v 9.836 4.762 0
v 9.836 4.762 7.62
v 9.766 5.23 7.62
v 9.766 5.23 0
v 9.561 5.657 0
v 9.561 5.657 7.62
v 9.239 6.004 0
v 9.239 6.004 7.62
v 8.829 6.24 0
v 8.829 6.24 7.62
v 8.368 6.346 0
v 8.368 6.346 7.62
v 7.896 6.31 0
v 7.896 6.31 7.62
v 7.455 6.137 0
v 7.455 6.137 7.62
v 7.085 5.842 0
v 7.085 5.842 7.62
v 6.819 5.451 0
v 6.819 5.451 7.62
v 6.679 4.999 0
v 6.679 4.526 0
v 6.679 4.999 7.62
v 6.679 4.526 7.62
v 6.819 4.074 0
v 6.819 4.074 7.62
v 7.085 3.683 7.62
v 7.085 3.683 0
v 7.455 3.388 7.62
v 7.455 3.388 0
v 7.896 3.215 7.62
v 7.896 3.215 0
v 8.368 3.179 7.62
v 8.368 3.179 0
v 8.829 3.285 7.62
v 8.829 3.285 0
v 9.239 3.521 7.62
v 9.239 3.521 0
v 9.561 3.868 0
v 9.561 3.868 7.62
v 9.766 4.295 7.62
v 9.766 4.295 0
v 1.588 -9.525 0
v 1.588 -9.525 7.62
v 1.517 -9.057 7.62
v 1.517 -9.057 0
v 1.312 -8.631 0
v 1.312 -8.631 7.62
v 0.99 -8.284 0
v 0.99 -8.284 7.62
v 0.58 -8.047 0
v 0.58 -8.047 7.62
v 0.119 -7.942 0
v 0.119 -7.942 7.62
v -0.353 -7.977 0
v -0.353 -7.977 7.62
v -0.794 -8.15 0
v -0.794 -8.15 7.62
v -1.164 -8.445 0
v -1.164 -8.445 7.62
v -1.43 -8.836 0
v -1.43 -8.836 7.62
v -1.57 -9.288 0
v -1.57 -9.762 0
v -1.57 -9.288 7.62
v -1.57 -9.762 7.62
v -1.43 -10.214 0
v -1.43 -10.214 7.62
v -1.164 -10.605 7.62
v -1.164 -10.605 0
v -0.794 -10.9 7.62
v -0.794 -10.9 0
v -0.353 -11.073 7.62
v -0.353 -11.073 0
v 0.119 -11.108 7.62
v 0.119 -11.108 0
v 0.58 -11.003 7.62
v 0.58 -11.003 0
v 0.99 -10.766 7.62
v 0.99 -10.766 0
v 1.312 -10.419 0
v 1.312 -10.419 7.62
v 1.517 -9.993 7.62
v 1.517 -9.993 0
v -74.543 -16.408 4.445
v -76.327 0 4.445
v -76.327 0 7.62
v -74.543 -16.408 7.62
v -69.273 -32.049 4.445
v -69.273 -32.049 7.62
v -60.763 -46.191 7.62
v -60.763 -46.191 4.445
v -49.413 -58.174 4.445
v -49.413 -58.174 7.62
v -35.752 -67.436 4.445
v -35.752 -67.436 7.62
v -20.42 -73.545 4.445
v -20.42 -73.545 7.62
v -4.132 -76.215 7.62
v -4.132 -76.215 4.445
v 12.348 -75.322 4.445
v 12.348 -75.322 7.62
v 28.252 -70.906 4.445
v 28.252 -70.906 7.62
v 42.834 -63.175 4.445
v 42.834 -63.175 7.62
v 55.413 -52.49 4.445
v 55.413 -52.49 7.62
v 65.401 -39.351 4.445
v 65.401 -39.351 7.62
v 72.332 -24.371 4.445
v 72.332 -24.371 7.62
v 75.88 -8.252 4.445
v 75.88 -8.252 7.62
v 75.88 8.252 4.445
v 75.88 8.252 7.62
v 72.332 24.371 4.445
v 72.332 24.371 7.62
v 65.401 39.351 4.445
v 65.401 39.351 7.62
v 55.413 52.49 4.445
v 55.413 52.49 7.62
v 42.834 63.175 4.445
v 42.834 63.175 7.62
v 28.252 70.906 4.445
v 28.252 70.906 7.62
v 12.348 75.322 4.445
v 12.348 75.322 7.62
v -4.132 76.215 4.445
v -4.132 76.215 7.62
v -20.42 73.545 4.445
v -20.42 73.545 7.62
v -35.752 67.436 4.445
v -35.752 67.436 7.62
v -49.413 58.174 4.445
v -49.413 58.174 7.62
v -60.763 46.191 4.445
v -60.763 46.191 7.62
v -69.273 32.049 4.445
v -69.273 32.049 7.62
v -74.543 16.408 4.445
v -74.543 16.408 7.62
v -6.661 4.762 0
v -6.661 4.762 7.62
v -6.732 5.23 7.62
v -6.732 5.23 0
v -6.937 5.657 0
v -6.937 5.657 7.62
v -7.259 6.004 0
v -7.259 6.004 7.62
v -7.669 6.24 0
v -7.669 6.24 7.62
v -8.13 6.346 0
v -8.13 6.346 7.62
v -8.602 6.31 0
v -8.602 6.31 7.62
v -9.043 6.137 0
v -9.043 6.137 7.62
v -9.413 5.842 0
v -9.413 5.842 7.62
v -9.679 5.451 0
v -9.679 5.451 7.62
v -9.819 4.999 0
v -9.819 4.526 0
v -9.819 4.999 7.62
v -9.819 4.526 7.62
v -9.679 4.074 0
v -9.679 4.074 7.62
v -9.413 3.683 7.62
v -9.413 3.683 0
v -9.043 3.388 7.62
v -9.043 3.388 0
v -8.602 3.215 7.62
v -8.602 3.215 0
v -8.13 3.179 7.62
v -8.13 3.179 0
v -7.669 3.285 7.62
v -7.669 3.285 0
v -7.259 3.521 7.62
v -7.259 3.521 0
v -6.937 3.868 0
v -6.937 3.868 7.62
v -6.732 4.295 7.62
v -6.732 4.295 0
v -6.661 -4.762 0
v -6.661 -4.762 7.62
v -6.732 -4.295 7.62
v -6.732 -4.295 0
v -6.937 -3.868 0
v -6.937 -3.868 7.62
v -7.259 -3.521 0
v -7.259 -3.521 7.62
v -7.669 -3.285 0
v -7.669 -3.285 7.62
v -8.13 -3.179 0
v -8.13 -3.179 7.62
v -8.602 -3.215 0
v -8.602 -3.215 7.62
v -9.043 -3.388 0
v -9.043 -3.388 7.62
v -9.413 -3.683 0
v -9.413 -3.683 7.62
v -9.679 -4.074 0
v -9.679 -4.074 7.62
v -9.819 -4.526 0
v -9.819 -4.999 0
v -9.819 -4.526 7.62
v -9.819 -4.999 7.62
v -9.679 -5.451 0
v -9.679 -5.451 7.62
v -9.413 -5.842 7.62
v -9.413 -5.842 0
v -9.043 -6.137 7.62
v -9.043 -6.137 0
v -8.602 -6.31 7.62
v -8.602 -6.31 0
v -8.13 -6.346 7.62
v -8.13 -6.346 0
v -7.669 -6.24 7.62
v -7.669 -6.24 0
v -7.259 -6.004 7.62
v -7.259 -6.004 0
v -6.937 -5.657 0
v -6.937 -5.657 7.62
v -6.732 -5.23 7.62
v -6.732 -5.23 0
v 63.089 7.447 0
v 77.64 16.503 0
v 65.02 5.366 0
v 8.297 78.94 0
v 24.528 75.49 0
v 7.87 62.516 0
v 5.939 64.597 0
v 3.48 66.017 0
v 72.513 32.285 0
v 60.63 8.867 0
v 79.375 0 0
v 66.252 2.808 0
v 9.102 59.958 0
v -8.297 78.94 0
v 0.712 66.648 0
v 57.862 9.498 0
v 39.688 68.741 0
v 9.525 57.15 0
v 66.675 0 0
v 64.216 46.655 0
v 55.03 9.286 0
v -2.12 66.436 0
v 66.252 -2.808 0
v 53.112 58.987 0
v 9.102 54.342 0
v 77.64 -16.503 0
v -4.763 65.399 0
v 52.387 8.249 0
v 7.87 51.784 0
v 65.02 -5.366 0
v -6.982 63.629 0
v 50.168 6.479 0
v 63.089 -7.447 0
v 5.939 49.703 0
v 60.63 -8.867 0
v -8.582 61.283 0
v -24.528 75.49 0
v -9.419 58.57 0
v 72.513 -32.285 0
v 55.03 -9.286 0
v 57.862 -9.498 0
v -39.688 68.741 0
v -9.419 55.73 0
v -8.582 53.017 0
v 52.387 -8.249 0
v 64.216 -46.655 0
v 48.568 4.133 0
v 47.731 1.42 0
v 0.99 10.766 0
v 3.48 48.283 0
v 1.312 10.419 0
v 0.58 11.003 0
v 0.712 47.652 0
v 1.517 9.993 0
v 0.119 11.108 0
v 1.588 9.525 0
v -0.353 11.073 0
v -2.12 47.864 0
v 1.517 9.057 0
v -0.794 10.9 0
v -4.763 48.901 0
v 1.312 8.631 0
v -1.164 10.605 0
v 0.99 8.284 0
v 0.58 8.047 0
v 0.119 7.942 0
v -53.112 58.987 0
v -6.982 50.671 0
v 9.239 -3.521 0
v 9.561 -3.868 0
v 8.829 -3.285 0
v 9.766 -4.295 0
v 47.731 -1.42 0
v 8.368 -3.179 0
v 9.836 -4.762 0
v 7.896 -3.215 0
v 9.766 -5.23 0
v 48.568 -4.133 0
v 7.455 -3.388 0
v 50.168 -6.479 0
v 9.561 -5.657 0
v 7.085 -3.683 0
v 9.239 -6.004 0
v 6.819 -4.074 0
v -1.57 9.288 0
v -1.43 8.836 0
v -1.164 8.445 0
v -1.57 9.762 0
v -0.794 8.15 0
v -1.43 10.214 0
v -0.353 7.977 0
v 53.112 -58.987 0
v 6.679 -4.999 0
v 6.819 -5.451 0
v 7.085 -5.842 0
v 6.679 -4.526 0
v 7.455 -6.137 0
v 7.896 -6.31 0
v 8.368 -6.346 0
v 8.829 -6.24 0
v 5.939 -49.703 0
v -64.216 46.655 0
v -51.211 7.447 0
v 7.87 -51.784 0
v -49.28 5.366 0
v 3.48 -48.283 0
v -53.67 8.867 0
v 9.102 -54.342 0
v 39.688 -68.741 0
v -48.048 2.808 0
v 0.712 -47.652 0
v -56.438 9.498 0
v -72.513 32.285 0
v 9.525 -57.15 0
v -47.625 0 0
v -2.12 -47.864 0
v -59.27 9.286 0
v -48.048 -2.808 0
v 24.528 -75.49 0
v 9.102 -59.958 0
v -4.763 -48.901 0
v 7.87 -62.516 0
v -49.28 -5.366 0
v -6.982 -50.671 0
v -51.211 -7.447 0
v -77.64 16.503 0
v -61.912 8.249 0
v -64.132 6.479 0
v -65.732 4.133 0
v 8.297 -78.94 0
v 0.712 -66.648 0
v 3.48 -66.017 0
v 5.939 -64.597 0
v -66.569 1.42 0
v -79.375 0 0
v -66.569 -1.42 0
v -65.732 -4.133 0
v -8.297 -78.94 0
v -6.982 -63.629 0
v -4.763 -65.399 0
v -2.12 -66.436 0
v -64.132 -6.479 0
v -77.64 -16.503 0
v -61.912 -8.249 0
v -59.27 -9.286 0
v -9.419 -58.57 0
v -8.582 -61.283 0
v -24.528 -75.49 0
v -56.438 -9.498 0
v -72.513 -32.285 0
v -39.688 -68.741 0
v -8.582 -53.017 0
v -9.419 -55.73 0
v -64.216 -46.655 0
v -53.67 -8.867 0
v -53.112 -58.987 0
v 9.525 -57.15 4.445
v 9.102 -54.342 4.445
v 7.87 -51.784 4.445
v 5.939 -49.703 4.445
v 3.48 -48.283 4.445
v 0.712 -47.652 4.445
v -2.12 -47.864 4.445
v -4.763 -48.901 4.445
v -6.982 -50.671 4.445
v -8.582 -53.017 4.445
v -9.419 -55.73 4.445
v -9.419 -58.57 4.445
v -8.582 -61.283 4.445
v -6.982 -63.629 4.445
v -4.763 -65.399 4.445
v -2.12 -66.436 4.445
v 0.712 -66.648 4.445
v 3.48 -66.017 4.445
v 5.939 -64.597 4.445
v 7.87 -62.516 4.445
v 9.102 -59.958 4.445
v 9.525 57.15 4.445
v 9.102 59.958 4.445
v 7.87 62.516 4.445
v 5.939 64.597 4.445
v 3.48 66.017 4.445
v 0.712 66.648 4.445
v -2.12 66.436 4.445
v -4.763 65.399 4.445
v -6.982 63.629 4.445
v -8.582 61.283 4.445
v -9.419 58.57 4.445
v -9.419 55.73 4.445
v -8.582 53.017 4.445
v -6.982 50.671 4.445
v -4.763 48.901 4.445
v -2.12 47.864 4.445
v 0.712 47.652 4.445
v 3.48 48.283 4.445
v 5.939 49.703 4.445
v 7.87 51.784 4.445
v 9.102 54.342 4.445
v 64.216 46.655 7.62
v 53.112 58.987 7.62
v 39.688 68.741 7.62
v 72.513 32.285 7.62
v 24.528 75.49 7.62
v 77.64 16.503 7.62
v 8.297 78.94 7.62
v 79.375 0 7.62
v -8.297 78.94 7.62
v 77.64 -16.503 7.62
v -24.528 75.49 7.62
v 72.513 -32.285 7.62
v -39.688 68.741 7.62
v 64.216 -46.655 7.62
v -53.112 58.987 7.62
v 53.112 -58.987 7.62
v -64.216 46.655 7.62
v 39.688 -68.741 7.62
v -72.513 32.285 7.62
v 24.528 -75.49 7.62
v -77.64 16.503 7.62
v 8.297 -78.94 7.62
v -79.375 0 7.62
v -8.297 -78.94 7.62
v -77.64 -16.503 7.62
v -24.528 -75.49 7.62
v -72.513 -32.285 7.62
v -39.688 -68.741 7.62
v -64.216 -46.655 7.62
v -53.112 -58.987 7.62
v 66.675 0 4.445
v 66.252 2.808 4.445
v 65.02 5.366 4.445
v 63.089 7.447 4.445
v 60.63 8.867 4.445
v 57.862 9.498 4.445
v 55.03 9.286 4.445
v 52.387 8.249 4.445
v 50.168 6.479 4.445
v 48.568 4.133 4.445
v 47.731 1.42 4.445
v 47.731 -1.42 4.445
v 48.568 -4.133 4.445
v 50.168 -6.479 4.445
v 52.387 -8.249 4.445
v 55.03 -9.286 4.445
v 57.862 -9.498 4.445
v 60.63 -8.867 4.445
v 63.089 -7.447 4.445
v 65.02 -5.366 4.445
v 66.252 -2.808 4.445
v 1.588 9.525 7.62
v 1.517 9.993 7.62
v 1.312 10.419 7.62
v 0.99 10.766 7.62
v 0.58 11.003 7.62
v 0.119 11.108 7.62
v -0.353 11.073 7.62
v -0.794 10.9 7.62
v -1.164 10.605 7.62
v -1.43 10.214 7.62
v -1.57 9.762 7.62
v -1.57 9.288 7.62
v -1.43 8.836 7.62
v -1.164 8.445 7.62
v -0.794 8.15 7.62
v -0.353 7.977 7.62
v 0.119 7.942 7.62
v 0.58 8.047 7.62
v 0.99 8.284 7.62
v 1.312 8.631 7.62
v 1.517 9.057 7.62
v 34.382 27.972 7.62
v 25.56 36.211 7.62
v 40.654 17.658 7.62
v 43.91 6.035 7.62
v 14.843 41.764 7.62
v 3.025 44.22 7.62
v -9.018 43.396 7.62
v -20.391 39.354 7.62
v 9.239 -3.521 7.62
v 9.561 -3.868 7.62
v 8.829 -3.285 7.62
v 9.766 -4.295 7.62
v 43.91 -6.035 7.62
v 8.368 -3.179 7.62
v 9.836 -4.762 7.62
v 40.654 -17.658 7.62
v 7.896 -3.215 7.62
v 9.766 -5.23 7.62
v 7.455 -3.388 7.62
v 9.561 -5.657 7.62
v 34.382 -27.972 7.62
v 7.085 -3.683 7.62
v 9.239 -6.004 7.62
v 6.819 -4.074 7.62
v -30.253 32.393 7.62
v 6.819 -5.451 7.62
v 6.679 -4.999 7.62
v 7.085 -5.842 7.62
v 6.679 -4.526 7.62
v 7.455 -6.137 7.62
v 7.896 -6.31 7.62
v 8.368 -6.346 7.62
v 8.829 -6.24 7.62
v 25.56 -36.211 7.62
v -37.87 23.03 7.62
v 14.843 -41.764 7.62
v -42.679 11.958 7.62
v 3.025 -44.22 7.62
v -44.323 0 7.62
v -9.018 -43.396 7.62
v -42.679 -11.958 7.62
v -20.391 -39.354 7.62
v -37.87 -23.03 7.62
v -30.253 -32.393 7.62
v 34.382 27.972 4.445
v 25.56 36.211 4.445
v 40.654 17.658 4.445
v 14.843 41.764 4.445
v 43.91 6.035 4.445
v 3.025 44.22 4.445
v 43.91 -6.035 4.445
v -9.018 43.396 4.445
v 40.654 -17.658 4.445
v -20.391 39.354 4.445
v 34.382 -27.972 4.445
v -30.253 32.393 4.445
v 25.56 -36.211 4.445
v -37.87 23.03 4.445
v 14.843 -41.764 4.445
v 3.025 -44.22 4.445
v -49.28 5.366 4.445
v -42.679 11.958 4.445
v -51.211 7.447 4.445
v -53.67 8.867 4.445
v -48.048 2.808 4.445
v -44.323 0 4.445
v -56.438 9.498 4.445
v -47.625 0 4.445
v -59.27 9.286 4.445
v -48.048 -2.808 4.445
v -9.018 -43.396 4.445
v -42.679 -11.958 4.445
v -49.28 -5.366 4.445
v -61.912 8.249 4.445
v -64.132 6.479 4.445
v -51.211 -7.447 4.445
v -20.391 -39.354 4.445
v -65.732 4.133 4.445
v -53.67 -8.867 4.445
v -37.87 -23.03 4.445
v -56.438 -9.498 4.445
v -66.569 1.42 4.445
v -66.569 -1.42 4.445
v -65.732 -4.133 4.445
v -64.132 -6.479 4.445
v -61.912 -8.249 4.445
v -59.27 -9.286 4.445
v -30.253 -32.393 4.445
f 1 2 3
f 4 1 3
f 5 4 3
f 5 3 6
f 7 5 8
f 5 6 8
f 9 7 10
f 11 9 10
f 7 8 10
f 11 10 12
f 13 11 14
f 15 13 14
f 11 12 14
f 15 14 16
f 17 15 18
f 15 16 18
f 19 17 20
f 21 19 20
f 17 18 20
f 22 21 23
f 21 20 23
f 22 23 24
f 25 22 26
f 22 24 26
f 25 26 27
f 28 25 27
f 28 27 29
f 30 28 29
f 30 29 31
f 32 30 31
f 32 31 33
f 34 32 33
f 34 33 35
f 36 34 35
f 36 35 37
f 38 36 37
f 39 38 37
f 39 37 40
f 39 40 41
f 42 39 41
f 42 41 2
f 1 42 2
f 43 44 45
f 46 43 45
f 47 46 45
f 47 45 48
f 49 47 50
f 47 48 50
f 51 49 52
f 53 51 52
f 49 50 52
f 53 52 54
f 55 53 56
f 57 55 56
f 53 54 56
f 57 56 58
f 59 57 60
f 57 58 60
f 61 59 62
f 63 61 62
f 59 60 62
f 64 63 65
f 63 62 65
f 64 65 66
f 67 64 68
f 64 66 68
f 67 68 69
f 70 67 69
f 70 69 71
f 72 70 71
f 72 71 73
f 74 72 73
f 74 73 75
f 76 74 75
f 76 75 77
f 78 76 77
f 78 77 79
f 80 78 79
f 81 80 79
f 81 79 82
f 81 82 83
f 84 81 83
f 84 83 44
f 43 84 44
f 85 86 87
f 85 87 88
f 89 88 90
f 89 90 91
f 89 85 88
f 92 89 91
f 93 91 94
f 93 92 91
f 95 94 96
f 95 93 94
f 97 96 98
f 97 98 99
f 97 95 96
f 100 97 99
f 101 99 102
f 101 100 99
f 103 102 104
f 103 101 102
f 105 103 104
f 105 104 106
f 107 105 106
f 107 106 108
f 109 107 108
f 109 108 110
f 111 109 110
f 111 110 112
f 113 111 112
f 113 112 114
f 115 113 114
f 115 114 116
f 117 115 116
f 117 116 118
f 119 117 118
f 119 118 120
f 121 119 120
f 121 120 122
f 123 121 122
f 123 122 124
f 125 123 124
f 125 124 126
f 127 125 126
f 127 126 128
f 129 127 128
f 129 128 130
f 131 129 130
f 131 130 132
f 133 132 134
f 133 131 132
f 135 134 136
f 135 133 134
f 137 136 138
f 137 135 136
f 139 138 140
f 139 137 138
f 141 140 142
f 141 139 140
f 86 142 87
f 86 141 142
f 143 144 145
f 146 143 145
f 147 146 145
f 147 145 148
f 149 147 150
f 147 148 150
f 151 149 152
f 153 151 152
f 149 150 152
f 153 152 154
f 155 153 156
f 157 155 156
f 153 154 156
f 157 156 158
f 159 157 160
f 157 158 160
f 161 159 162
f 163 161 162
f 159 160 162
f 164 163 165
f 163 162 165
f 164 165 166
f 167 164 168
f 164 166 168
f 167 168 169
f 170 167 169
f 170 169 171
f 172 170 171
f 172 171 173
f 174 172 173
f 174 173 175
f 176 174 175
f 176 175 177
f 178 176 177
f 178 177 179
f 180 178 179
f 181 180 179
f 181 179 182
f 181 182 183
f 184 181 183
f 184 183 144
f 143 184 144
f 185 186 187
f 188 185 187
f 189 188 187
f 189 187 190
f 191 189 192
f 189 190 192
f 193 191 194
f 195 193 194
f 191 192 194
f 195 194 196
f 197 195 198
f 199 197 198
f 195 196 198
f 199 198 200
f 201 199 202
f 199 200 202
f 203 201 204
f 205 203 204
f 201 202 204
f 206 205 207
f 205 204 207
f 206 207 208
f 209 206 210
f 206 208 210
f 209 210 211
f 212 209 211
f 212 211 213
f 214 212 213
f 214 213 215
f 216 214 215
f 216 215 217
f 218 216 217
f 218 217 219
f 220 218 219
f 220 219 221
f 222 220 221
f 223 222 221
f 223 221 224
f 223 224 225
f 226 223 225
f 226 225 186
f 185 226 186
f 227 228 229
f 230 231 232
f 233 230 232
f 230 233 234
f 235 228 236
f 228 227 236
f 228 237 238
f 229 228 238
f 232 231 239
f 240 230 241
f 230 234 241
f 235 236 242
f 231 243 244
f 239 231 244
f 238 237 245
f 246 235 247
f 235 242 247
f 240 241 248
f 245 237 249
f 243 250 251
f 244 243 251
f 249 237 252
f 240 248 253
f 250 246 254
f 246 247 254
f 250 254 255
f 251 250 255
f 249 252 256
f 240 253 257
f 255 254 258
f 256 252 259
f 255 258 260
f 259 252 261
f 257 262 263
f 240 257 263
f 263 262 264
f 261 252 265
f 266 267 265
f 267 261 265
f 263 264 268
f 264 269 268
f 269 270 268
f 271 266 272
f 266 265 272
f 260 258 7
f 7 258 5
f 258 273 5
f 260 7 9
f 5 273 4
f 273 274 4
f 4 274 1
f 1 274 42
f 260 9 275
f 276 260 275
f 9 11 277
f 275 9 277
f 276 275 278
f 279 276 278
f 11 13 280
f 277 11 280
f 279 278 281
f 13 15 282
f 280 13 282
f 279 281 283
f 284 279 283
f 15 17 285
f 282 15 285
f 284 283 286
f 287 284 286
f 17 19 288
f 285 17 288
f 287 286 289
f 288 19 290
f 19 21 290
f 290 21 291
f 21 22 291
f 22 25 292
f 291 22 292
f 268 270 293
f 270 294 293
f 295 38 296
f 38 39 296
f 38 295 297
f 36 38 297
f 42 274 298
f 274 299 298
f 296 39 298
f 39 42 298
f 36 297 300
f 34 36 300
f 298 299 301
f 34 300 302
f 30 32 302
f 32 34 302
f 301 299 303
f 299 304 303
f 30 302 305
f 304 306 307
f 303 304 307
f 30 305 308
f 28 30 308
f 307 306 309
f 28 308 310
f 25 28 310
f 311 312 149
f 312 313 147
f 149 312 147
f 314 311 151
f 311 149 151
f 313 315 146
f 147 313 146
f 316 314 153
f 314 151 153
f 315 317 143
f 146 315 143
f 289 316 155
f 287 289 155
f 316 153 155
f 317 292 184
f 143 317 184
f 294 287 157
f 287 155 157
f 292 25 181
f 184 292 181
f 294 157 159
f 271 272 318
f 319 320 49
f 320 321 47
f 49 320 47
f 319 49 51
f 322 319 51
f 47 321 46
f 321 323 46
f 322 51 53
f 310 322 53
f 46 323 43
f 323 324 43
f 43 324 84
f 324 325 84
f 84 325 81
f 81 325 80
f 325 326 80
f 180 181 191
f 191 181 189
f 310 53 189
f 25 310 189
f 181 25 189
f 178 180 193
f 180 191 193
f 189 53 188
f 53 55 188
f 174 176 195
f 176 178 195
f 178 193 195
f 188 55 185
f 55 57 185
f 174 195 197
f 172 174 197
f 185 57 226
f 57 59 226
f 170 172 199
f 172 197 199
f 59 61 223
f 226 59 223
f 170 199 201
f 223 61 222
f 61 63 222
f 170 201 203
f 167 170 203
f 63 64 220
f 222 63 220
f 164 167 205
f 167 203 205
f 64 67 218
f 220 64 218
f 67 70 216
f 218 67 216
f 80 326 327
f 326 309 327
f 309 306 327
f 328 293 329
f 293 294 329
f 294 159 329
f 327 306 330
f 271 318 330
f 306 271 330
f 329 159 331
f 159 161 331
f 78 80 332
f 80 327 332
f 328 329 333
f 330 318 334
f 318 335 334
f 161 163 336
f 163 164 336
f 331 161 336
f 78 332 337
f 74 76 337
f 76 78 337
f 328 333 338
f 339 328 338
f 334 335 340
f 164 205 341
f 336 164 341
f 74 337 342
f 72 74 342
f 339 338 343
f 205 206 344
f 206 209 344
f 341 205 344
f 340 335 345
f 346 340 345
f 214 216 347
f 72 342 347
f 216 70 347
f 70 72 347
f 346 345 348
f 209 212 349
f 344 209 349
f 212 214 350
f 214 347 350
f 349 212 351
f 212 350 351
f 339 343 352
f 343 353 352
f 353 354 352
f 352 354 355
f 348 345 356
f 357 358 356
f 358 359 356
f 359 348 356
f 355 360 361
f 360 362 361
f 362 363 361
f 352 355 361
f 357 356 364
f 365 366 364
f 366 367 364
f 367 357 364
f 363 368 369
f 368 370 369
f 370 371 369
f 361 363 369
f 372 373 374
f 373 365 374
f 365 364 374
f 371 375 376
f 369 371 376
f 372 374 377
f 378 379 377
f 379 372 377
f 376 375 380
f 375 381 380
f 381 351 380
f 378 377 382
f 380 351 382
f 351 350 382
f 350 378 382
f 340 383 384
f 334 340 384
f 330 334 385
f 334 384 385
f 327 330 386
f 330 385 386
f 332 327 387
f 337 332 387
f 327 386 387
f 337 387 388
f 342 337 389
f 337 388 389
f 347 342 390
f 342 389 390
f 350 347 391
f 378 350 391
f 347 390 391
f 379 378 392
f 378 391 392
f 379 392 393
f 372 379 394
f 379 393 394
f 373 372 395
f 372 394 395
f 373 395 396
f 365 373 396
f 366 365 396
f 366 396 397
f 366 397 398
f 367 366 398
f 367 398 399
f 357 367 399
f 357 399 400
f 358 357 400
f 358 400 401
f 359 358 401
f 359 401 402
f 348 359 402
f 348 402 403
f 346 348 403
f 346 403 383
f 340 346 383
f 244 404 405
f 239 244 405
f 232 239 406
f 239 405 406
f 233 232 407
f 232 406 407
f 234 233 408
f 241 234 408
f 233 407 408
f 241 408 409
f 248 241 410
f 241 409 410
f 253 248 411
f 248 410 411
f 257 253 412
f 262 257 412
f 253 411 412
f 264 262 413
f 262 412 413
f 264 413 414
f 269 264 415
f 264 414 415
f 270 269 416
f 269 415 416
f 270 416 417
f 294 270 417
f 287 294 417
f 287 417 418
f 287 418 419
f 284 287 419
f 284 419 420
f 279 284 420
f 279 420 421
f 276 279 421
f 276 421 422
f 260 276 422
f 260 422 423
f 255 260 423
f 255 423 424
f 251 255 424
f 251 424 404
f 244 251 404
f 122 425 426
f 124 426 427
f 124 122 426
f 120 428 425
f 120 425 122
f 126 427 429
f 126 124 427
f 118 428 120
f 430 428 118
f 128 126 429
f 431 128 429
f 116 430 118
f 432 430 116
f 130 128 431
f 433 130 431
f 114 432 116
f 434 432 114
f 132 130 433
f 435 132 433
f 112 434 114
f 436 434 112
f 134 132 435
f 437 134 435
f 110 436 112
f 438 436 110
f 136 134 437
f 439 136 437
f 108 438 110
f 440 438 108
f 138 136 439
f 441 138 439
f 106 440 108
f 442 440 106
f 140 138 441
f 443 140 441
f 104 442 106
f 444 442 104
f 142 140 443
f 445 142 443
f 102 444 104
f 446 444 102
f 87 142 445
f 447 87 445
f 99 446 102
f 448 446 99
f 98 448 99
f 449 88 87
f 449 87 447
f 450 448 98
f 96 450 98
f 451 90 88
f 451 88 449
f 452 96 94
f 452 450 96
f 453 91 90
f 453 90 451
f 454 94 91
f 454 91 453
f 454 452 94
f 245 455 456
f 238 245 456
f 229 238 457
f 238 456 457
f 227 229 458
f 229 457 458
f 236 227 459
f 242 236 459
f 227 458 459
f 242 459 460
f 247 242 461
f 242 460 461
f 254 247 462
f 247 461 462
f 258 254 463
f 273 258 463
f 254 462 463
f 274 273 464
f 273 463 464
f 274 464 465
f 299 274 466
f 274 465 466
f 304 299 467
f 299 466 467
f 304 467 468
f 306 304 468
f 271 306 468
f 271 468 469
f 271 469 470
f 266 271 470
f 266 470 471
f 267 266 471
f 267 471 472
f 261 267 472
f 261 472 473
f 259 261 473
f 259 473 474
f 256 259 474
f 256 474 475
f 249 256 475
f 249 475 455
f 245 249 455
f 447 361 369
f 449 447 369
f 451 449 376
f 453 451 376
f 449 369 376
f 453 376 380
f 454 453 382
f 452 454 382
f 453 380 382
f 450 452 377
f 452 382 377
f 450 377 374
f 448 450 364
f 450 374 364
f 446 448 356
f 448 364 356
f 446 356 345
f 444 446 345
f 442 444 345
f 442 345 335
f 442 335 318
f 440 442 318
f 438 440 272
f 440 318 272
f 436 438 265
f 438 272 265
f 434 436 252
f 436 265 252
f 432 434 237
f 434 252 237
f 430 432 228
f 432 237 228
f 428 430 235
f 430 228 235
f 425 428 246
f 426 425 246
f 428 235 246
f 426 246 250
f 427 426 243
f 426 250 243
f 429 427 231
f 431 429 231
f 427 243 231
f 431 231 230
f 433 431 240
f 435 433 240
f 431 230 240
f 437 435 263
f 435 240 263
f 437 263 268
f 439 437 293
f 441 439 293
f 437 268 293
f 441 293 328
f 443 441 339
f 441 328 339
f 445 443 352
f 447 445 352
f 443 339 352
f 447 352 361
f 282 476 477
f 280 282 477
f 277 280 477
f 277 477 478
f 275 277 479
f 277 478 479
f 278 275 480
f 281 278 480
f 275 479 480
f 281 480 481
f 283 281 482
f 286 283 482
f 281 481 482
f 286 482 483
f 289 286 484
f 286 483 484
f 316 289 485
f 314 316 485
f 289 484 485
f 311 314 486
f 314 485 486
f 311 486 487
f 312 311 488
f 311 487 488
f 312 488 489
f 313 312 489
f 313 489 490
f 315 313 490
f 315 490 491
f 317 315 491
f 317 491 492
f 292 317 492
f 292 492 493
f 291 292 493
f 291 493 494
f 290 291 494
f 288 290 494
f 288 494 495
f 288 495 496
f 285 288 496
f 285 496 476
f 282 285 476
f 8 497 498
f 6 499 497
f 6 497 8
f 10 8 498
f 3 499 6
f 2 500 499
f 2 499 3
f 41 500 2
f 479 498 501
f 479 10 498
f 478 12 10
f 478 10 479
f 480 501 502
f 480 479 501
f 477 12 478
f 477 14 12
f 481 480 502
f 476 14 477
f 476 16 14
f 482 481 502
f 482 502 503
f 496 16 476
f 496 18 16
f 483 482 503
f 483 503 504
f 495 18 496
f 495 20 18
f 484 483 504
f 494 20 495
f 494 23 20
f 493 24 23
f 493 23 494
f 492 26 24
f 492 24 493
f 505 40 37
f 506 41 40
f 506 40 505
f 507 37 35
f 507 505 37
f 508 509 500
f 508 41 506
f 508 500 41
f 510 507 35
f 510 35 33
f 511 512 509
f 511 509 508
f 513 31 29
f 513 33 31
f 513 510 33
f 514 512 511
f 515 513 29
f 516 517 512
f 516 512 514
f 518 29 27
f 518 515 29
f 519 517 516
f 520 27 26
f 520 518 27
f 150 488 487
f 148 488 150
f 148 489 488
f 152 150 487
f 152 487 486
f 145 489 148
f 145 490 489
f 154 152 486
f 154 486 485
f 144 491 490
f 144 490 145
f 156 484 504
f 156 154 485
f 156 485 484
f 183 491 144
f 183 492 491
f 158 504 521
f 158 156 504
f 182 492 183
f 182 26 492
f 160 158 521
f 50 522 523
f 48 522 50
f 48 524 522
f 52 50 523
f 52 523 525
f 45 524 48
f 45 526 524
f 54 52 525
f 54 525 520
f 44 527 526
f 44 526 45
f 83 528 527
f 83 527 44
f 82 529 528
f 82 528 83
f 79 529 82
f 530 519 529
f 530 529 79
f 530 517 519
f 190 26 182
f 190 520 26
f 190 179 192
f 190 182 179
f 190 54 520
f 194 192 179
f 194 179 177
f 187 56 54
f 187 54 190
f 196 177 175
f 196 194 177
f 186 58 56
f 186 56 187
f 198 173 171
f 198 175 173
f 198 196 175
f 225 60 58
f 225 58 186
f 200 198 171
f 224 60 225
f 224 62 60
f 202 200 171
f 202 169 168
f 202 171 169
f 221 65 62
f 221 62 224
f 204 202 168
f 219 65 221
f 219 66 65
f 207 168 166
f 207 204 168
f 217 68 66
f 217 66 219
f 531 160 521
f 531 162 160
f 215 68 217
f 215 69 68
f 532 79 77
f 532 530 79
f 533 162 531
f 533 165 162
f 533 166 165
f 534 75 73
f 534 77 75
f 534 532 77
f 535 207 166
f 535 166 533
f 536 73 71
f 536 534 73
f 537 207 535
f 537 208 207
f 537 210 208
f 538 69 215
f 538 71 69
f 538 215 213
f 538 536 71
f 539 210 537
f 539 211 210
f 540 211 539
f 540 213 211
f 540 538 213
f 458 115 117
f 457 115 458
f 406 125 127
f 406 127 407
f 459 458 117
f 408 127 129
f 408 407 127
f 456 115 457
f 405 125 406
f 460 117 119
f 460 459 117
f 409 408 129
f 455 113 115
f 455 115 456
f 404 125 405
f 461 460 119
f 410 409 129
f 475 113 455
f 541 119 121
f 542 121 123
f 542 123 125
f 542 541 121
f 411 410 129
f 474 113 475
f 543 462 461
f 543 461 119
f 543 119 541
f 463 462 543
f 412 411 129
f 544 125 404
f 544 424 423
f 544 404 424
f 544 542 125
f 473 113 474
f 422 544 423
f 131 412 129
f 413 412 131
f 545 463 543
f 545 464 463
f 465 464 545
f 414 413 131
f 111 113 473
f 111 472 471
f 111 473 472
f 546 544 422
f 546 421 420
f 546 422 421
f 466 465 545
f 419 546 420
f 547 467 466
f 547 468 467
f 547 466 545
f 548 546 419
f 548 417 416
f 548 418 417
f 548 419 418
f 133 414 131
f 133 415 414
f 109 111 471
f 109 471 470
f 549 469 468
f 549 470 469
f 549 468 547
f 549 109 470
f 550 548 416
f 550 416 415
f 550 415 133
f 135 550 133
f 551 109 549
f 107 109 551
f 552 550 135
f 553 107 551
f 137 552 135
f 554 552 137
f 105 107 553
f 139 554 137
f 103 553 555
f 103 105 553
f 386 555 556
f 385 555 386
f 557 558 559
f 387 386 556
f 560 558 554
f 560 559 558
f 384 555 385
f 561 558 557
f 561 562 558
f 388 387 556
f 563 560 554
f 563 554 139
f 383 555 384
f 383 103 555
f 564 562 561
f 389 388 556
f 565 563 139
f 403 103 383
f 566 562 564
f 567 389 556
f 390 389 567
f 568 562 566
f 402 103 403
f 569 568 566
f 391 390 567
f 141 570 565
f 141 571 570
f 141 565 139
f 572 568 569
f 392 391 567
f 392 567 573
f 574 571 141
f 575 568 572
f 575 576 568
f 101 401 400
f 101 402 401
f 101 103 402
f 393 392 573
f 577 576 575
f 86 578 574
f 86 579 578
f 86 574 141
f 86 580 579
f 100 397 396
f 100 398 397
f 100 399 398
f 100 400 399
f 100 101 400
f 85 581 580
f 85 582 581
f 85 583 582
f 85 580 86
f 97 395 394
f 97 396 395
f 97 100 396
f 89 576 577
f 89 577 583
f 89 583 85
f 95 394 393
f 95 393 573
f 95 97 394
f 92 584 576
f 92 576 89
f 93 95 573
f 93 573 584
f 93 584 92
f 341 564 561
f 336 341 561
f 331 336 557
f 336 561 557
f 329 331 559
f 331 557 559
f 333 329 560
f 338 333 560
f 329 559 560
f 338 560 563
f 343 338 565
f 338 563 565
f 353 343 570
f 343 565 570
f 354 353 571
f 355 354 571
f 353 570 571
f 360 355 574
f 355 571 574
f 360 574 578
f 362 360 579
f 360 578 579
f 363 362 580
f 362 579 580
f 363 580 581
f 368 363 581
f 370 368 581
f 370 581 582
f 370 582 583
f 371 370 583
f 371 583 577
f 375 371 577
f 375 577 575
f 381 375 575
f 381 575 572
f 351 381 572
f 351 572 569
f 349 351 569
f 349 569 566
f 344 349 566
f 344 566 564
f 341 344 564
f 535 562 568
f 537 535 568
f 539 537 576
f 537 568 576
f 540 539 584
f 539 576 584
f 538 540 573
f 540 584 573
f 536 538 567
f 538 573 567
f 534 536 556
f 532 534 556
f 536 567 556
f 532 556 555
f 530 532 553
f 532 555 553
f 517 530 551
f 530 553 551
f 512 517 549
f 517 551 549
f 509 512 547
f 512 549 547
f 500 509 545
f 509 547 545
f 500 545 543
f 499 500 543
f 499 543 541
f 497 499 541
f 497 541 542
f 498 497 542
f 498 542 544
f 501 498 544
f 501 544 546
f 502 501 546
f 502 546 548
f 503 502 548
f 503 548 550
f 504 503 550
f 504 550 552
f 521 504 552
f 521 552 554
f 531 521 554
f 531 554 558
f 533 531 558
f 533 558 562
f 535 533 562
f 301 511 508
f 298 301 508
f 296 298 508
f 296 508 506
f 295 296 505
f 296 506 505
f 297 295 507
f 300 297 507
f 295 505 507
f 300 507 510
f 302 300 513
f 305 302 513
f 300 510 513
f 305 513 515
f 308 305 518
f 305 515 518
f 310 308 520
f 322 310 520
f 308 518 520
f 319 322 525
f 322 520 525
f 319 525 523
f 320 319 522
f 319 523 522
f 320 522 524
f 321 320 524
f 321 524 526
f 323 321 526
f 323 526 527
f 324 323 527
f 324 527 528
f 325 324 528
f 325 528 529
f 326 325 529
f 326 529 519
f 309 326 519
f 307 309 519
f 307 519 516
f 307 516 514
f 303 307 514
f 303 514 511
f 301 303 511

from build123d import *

# Parameters (mm, degrees)
SKETCH1_R             = 79.375
SKETCH1_R_2           = 76.327
BOSS_EXTRUDE1_DEPTH   = 7.62
SKETCH1_R_3           = 44.323
BOSS_EXTRUDE1_2_DEPTH = 7.62
SKETCH1_3_R           = 76.327
SKETCH1_3_R_2         = 44.323
BOSS_EXTRUDE2_DEPTH   = 4.445
CUT_EXTRUDE1_REACH    = 114.512
SKETCH2_R             = 1.5875
CUT_EXTRUDE2_REACH    = 114.341
SKETCH3_R             = 9.525


with BuildPart() as part:
    # Sketch1 → Boss-Extrude1 (new body)
    with BuildSketch(Plane.XY):
        Circle(SKETCH1_R)
        Circle(SKETCH1_R_2, mode=Mode.SUBTRACT)
    extrude(amount=BOSS_EXTRUDE1_DEPTH)



with BuildPart() as body_2:
    # Sketch1 → Boss-Extrude1 2 (new body)
    with BuildSketch(Plane.XY):
        Circle(SKETCH1_R_3)
    extrude(amount=BOSS_EXTRUDE1_2_DEPTH)


with BuildPart() as part_1:
    add(part.part)

    add(body_2.part)  # Boss-Extrude2 merges body 2
    # Sketch1<3> → Boss-Extrude2 (add)
    with BuildSketch(Plane.XY):
        Circle(SKETCH1_3_R)
        Circle(SKETCH1_3_R_2, mode=Mode.SUBTRACT)
    extrude(amount=BOSS_EXTRUDE2_DEPTH)

    # Sketch2 → Cut-Extrude1 (cut, up to next)
    with BuildSketch(Plane.XY.offset(7.62), mode=Mode.PRIVATE) as cut_extrude1_sk1:
        with Locations((0, 9.525)):
            Circle(SKETCH2_R)
    cut_extrude1_tool1 = extrude(cut_extrude1_sk1.sketch, amount=-CUT_EXTRUDE1_REACH, mode=Mode.PRIVATE) & part_1.part
    # Sketch2 → Cut-Extrude1 (cut, up to next)
    with BuildSketch(Plane.XY.offset(7.62), mode=Mode.PRIVATE) as cut_extrude1_sk2:
        with Locations((-8.248891971, 4.7625)):
            Circle(SKETCH2_R)
    cut_extrude1_tool2 = extrude(cut_extrude1_sk2.sketch, amount=-CUT_EXTRUDE1_REACH, mode=Mode.PRIVATE) & part_1.part
    # Sketch2 → Cut-Extrude1 (cut, up to next)
    with BuildSketch(Plane.XY.offset(7.62), mode=Mode.PRIVATE) as cut_extrude1_sk3:
        with Locations((8.248891971, 4.7625)):
            Circle(SKETCH2_R)
    cut_extrude1_tool3 = extrude(cut_extrude1_sk3.sketch, amount=-CUT_EXTRUDE1_REACH, mode=Mode.PRIVATE) & part_1.part
    # Sketch2 → Cut-Extrude1 (cut, up to next)
    with BuildSketch(Plane.XY.offset(7.62), mode=Mode.PRIVATE) as cut_extrude1_sk4:
        with Locations((-8.248891971, -4.7625)):
            Circle(SKETCH2_R)
    cut_extrude1_tool4 = extrude(cut_extrude1_sk4.sketch, amount=-CUT_EXTRUDE1_REACH, mode=Mode.PRIVATE) & part_1.part
    # Sketch2 → Cut-Extrude1 (cut, up to next)
    with BuildSketch(Plane.XY.offset(7.62), mode=Mode.PRIVATE) as cut_extrude1_sk5:
        with Locations((8.248891971, -4.7625)):
            Circle(SKETCH2_R)
    cut_extrude1_tool5 = extrude(cut_extrude1_sk5.sketch, amount=-CUT_EXTRUDE1_REACH, mode=Mode.PRIVATE) & part_1.part
    # Sketch2 → Cut-Extrude1 (cut, up to next)
    with BuildSketch(Plane.XY.offset(7.62), mode=Mode.PRIVATE) as cut_extrude1_sk6:
        with Locations((0, -9.525)):
            Circle(SKETCH2_R)
    cut_extrude1_tool6 = extrude(cut_extrude1_sk6.sketch, amount=-CUT_EXTRUDE1_REACH, mode=Mode.PRIVATE) & part_1.part
    add(cut_extrude1_tool1.solids().sort_by_distance((0, 9.525, 7.62))[0], mode=Mode.SUBTRACT)
    add(cut_extrude1_tool2.solids().sort_by_distance((-8.248892, 4.7625, 7.62))[0], mode=Mode.SUBTRACT)
    add(cut_extrude1_tool3.solids().sort_by_distance((8.248892, 4.7625, 7.62))[0], mode=Mode.SUBTRACT)
    add(cut_extrude1_tool4.solids().sort_by_distance((-8.248892, -4.7625, 7.62))[0], mode=Mode.SUBTRACT)
    add(cut_extrude1_tool5.solids().sort_by_distance((8.248892, -4.7625, 7.62))[0], mode=Mode.SUBTRACT)
    add(cut_extrude1_tool6.solids().sort_by_distance((0, -9.525, 7.62))[0], mode=Mode.SUBTRACT)

    # Sketch3 → Cut-Extrude2 (cut, up to next)
    with BuildSketch(Plane.XY.offset(4.445), mode=Mode.PRIVATE) as cut_extrude2_sk1:
        with Locations((57.15, 0)):
            Circle(SKETCH3_R)
    cut_extrude2_tool1 = extrude(cut_extrude2_sk1.sketch, amount=-CUT_EXTRUDE2_REACH, mode=Mode.PRIVATE) & part_1.part
    # Sketch3 → Cut-Extrude2 (cut, up to next)
    with BuildSketch(Plane.XY.offset(4.445), mode=Mode.PRIVATE) as cut_extrude2_sk2:
        with Locations((0, 57.15)):
            Circle(SKETCH3_R)
    cut_extrude2_tool2 = extrude(cut_extrude2_sk2.sketch, amount=-CUT_EXTRUDE2_REACH, mode=Mode.PRIVATE) & part_1.part
    # Sketch3 → Cut-Extrude2 (cut, up to next)
    with BuildSketch(Plane.XY.offset(4.445), mode=Mode.PRIVATE) as cut_extrude2_sk3:
        with Locations((0, -57.15)):
            Circle(SKETCH3_R)
    cut_extrude2_tool3 = extrude(cut_extrude2_sk3.sketch, amount=-CUT_EXTRUDE2_REACH, mode=Mode.PRIVATE) & part_1.part
    # Sketch3 → Cut-Extrude2 (cut, up to next)
    with BuildSketch(Plane.XY.offset(4.445), mode=Mode.PRIVATE) as cut_extrude2_sk4:
        with Locations((-57.15, 0)):
            Circle(SKETCH3_R)
    cut_extrude2_tool4 = extrude(cut_extrude2_sk4.sketch, amount=-CUT_EXTRUDE2_REACH, mode=Mode.PRIVATE) & part_1.part
    add(cut_extrude2_tool1.solids().sort_by_distance((57.15, 0, 4.445))[0], mode=Mode.SUBTRACT)
    add(cut_extrude2_tool2.solids().sort_by_distance((0, 57.15, 4.445))[0], mode=Mode.SUBTRACT)
    add(cut_extrude2_tool3.solids().sort_by_distance((0, -57.15, 4.445))[0], mode=Mode.SUBTRACT)
    add(cut_extrude2_tool4.solids().sort_by_distance((-57.15, 0, 4.445))[0], mode=Mode.SUBTRACT)


solid = part_1.part
